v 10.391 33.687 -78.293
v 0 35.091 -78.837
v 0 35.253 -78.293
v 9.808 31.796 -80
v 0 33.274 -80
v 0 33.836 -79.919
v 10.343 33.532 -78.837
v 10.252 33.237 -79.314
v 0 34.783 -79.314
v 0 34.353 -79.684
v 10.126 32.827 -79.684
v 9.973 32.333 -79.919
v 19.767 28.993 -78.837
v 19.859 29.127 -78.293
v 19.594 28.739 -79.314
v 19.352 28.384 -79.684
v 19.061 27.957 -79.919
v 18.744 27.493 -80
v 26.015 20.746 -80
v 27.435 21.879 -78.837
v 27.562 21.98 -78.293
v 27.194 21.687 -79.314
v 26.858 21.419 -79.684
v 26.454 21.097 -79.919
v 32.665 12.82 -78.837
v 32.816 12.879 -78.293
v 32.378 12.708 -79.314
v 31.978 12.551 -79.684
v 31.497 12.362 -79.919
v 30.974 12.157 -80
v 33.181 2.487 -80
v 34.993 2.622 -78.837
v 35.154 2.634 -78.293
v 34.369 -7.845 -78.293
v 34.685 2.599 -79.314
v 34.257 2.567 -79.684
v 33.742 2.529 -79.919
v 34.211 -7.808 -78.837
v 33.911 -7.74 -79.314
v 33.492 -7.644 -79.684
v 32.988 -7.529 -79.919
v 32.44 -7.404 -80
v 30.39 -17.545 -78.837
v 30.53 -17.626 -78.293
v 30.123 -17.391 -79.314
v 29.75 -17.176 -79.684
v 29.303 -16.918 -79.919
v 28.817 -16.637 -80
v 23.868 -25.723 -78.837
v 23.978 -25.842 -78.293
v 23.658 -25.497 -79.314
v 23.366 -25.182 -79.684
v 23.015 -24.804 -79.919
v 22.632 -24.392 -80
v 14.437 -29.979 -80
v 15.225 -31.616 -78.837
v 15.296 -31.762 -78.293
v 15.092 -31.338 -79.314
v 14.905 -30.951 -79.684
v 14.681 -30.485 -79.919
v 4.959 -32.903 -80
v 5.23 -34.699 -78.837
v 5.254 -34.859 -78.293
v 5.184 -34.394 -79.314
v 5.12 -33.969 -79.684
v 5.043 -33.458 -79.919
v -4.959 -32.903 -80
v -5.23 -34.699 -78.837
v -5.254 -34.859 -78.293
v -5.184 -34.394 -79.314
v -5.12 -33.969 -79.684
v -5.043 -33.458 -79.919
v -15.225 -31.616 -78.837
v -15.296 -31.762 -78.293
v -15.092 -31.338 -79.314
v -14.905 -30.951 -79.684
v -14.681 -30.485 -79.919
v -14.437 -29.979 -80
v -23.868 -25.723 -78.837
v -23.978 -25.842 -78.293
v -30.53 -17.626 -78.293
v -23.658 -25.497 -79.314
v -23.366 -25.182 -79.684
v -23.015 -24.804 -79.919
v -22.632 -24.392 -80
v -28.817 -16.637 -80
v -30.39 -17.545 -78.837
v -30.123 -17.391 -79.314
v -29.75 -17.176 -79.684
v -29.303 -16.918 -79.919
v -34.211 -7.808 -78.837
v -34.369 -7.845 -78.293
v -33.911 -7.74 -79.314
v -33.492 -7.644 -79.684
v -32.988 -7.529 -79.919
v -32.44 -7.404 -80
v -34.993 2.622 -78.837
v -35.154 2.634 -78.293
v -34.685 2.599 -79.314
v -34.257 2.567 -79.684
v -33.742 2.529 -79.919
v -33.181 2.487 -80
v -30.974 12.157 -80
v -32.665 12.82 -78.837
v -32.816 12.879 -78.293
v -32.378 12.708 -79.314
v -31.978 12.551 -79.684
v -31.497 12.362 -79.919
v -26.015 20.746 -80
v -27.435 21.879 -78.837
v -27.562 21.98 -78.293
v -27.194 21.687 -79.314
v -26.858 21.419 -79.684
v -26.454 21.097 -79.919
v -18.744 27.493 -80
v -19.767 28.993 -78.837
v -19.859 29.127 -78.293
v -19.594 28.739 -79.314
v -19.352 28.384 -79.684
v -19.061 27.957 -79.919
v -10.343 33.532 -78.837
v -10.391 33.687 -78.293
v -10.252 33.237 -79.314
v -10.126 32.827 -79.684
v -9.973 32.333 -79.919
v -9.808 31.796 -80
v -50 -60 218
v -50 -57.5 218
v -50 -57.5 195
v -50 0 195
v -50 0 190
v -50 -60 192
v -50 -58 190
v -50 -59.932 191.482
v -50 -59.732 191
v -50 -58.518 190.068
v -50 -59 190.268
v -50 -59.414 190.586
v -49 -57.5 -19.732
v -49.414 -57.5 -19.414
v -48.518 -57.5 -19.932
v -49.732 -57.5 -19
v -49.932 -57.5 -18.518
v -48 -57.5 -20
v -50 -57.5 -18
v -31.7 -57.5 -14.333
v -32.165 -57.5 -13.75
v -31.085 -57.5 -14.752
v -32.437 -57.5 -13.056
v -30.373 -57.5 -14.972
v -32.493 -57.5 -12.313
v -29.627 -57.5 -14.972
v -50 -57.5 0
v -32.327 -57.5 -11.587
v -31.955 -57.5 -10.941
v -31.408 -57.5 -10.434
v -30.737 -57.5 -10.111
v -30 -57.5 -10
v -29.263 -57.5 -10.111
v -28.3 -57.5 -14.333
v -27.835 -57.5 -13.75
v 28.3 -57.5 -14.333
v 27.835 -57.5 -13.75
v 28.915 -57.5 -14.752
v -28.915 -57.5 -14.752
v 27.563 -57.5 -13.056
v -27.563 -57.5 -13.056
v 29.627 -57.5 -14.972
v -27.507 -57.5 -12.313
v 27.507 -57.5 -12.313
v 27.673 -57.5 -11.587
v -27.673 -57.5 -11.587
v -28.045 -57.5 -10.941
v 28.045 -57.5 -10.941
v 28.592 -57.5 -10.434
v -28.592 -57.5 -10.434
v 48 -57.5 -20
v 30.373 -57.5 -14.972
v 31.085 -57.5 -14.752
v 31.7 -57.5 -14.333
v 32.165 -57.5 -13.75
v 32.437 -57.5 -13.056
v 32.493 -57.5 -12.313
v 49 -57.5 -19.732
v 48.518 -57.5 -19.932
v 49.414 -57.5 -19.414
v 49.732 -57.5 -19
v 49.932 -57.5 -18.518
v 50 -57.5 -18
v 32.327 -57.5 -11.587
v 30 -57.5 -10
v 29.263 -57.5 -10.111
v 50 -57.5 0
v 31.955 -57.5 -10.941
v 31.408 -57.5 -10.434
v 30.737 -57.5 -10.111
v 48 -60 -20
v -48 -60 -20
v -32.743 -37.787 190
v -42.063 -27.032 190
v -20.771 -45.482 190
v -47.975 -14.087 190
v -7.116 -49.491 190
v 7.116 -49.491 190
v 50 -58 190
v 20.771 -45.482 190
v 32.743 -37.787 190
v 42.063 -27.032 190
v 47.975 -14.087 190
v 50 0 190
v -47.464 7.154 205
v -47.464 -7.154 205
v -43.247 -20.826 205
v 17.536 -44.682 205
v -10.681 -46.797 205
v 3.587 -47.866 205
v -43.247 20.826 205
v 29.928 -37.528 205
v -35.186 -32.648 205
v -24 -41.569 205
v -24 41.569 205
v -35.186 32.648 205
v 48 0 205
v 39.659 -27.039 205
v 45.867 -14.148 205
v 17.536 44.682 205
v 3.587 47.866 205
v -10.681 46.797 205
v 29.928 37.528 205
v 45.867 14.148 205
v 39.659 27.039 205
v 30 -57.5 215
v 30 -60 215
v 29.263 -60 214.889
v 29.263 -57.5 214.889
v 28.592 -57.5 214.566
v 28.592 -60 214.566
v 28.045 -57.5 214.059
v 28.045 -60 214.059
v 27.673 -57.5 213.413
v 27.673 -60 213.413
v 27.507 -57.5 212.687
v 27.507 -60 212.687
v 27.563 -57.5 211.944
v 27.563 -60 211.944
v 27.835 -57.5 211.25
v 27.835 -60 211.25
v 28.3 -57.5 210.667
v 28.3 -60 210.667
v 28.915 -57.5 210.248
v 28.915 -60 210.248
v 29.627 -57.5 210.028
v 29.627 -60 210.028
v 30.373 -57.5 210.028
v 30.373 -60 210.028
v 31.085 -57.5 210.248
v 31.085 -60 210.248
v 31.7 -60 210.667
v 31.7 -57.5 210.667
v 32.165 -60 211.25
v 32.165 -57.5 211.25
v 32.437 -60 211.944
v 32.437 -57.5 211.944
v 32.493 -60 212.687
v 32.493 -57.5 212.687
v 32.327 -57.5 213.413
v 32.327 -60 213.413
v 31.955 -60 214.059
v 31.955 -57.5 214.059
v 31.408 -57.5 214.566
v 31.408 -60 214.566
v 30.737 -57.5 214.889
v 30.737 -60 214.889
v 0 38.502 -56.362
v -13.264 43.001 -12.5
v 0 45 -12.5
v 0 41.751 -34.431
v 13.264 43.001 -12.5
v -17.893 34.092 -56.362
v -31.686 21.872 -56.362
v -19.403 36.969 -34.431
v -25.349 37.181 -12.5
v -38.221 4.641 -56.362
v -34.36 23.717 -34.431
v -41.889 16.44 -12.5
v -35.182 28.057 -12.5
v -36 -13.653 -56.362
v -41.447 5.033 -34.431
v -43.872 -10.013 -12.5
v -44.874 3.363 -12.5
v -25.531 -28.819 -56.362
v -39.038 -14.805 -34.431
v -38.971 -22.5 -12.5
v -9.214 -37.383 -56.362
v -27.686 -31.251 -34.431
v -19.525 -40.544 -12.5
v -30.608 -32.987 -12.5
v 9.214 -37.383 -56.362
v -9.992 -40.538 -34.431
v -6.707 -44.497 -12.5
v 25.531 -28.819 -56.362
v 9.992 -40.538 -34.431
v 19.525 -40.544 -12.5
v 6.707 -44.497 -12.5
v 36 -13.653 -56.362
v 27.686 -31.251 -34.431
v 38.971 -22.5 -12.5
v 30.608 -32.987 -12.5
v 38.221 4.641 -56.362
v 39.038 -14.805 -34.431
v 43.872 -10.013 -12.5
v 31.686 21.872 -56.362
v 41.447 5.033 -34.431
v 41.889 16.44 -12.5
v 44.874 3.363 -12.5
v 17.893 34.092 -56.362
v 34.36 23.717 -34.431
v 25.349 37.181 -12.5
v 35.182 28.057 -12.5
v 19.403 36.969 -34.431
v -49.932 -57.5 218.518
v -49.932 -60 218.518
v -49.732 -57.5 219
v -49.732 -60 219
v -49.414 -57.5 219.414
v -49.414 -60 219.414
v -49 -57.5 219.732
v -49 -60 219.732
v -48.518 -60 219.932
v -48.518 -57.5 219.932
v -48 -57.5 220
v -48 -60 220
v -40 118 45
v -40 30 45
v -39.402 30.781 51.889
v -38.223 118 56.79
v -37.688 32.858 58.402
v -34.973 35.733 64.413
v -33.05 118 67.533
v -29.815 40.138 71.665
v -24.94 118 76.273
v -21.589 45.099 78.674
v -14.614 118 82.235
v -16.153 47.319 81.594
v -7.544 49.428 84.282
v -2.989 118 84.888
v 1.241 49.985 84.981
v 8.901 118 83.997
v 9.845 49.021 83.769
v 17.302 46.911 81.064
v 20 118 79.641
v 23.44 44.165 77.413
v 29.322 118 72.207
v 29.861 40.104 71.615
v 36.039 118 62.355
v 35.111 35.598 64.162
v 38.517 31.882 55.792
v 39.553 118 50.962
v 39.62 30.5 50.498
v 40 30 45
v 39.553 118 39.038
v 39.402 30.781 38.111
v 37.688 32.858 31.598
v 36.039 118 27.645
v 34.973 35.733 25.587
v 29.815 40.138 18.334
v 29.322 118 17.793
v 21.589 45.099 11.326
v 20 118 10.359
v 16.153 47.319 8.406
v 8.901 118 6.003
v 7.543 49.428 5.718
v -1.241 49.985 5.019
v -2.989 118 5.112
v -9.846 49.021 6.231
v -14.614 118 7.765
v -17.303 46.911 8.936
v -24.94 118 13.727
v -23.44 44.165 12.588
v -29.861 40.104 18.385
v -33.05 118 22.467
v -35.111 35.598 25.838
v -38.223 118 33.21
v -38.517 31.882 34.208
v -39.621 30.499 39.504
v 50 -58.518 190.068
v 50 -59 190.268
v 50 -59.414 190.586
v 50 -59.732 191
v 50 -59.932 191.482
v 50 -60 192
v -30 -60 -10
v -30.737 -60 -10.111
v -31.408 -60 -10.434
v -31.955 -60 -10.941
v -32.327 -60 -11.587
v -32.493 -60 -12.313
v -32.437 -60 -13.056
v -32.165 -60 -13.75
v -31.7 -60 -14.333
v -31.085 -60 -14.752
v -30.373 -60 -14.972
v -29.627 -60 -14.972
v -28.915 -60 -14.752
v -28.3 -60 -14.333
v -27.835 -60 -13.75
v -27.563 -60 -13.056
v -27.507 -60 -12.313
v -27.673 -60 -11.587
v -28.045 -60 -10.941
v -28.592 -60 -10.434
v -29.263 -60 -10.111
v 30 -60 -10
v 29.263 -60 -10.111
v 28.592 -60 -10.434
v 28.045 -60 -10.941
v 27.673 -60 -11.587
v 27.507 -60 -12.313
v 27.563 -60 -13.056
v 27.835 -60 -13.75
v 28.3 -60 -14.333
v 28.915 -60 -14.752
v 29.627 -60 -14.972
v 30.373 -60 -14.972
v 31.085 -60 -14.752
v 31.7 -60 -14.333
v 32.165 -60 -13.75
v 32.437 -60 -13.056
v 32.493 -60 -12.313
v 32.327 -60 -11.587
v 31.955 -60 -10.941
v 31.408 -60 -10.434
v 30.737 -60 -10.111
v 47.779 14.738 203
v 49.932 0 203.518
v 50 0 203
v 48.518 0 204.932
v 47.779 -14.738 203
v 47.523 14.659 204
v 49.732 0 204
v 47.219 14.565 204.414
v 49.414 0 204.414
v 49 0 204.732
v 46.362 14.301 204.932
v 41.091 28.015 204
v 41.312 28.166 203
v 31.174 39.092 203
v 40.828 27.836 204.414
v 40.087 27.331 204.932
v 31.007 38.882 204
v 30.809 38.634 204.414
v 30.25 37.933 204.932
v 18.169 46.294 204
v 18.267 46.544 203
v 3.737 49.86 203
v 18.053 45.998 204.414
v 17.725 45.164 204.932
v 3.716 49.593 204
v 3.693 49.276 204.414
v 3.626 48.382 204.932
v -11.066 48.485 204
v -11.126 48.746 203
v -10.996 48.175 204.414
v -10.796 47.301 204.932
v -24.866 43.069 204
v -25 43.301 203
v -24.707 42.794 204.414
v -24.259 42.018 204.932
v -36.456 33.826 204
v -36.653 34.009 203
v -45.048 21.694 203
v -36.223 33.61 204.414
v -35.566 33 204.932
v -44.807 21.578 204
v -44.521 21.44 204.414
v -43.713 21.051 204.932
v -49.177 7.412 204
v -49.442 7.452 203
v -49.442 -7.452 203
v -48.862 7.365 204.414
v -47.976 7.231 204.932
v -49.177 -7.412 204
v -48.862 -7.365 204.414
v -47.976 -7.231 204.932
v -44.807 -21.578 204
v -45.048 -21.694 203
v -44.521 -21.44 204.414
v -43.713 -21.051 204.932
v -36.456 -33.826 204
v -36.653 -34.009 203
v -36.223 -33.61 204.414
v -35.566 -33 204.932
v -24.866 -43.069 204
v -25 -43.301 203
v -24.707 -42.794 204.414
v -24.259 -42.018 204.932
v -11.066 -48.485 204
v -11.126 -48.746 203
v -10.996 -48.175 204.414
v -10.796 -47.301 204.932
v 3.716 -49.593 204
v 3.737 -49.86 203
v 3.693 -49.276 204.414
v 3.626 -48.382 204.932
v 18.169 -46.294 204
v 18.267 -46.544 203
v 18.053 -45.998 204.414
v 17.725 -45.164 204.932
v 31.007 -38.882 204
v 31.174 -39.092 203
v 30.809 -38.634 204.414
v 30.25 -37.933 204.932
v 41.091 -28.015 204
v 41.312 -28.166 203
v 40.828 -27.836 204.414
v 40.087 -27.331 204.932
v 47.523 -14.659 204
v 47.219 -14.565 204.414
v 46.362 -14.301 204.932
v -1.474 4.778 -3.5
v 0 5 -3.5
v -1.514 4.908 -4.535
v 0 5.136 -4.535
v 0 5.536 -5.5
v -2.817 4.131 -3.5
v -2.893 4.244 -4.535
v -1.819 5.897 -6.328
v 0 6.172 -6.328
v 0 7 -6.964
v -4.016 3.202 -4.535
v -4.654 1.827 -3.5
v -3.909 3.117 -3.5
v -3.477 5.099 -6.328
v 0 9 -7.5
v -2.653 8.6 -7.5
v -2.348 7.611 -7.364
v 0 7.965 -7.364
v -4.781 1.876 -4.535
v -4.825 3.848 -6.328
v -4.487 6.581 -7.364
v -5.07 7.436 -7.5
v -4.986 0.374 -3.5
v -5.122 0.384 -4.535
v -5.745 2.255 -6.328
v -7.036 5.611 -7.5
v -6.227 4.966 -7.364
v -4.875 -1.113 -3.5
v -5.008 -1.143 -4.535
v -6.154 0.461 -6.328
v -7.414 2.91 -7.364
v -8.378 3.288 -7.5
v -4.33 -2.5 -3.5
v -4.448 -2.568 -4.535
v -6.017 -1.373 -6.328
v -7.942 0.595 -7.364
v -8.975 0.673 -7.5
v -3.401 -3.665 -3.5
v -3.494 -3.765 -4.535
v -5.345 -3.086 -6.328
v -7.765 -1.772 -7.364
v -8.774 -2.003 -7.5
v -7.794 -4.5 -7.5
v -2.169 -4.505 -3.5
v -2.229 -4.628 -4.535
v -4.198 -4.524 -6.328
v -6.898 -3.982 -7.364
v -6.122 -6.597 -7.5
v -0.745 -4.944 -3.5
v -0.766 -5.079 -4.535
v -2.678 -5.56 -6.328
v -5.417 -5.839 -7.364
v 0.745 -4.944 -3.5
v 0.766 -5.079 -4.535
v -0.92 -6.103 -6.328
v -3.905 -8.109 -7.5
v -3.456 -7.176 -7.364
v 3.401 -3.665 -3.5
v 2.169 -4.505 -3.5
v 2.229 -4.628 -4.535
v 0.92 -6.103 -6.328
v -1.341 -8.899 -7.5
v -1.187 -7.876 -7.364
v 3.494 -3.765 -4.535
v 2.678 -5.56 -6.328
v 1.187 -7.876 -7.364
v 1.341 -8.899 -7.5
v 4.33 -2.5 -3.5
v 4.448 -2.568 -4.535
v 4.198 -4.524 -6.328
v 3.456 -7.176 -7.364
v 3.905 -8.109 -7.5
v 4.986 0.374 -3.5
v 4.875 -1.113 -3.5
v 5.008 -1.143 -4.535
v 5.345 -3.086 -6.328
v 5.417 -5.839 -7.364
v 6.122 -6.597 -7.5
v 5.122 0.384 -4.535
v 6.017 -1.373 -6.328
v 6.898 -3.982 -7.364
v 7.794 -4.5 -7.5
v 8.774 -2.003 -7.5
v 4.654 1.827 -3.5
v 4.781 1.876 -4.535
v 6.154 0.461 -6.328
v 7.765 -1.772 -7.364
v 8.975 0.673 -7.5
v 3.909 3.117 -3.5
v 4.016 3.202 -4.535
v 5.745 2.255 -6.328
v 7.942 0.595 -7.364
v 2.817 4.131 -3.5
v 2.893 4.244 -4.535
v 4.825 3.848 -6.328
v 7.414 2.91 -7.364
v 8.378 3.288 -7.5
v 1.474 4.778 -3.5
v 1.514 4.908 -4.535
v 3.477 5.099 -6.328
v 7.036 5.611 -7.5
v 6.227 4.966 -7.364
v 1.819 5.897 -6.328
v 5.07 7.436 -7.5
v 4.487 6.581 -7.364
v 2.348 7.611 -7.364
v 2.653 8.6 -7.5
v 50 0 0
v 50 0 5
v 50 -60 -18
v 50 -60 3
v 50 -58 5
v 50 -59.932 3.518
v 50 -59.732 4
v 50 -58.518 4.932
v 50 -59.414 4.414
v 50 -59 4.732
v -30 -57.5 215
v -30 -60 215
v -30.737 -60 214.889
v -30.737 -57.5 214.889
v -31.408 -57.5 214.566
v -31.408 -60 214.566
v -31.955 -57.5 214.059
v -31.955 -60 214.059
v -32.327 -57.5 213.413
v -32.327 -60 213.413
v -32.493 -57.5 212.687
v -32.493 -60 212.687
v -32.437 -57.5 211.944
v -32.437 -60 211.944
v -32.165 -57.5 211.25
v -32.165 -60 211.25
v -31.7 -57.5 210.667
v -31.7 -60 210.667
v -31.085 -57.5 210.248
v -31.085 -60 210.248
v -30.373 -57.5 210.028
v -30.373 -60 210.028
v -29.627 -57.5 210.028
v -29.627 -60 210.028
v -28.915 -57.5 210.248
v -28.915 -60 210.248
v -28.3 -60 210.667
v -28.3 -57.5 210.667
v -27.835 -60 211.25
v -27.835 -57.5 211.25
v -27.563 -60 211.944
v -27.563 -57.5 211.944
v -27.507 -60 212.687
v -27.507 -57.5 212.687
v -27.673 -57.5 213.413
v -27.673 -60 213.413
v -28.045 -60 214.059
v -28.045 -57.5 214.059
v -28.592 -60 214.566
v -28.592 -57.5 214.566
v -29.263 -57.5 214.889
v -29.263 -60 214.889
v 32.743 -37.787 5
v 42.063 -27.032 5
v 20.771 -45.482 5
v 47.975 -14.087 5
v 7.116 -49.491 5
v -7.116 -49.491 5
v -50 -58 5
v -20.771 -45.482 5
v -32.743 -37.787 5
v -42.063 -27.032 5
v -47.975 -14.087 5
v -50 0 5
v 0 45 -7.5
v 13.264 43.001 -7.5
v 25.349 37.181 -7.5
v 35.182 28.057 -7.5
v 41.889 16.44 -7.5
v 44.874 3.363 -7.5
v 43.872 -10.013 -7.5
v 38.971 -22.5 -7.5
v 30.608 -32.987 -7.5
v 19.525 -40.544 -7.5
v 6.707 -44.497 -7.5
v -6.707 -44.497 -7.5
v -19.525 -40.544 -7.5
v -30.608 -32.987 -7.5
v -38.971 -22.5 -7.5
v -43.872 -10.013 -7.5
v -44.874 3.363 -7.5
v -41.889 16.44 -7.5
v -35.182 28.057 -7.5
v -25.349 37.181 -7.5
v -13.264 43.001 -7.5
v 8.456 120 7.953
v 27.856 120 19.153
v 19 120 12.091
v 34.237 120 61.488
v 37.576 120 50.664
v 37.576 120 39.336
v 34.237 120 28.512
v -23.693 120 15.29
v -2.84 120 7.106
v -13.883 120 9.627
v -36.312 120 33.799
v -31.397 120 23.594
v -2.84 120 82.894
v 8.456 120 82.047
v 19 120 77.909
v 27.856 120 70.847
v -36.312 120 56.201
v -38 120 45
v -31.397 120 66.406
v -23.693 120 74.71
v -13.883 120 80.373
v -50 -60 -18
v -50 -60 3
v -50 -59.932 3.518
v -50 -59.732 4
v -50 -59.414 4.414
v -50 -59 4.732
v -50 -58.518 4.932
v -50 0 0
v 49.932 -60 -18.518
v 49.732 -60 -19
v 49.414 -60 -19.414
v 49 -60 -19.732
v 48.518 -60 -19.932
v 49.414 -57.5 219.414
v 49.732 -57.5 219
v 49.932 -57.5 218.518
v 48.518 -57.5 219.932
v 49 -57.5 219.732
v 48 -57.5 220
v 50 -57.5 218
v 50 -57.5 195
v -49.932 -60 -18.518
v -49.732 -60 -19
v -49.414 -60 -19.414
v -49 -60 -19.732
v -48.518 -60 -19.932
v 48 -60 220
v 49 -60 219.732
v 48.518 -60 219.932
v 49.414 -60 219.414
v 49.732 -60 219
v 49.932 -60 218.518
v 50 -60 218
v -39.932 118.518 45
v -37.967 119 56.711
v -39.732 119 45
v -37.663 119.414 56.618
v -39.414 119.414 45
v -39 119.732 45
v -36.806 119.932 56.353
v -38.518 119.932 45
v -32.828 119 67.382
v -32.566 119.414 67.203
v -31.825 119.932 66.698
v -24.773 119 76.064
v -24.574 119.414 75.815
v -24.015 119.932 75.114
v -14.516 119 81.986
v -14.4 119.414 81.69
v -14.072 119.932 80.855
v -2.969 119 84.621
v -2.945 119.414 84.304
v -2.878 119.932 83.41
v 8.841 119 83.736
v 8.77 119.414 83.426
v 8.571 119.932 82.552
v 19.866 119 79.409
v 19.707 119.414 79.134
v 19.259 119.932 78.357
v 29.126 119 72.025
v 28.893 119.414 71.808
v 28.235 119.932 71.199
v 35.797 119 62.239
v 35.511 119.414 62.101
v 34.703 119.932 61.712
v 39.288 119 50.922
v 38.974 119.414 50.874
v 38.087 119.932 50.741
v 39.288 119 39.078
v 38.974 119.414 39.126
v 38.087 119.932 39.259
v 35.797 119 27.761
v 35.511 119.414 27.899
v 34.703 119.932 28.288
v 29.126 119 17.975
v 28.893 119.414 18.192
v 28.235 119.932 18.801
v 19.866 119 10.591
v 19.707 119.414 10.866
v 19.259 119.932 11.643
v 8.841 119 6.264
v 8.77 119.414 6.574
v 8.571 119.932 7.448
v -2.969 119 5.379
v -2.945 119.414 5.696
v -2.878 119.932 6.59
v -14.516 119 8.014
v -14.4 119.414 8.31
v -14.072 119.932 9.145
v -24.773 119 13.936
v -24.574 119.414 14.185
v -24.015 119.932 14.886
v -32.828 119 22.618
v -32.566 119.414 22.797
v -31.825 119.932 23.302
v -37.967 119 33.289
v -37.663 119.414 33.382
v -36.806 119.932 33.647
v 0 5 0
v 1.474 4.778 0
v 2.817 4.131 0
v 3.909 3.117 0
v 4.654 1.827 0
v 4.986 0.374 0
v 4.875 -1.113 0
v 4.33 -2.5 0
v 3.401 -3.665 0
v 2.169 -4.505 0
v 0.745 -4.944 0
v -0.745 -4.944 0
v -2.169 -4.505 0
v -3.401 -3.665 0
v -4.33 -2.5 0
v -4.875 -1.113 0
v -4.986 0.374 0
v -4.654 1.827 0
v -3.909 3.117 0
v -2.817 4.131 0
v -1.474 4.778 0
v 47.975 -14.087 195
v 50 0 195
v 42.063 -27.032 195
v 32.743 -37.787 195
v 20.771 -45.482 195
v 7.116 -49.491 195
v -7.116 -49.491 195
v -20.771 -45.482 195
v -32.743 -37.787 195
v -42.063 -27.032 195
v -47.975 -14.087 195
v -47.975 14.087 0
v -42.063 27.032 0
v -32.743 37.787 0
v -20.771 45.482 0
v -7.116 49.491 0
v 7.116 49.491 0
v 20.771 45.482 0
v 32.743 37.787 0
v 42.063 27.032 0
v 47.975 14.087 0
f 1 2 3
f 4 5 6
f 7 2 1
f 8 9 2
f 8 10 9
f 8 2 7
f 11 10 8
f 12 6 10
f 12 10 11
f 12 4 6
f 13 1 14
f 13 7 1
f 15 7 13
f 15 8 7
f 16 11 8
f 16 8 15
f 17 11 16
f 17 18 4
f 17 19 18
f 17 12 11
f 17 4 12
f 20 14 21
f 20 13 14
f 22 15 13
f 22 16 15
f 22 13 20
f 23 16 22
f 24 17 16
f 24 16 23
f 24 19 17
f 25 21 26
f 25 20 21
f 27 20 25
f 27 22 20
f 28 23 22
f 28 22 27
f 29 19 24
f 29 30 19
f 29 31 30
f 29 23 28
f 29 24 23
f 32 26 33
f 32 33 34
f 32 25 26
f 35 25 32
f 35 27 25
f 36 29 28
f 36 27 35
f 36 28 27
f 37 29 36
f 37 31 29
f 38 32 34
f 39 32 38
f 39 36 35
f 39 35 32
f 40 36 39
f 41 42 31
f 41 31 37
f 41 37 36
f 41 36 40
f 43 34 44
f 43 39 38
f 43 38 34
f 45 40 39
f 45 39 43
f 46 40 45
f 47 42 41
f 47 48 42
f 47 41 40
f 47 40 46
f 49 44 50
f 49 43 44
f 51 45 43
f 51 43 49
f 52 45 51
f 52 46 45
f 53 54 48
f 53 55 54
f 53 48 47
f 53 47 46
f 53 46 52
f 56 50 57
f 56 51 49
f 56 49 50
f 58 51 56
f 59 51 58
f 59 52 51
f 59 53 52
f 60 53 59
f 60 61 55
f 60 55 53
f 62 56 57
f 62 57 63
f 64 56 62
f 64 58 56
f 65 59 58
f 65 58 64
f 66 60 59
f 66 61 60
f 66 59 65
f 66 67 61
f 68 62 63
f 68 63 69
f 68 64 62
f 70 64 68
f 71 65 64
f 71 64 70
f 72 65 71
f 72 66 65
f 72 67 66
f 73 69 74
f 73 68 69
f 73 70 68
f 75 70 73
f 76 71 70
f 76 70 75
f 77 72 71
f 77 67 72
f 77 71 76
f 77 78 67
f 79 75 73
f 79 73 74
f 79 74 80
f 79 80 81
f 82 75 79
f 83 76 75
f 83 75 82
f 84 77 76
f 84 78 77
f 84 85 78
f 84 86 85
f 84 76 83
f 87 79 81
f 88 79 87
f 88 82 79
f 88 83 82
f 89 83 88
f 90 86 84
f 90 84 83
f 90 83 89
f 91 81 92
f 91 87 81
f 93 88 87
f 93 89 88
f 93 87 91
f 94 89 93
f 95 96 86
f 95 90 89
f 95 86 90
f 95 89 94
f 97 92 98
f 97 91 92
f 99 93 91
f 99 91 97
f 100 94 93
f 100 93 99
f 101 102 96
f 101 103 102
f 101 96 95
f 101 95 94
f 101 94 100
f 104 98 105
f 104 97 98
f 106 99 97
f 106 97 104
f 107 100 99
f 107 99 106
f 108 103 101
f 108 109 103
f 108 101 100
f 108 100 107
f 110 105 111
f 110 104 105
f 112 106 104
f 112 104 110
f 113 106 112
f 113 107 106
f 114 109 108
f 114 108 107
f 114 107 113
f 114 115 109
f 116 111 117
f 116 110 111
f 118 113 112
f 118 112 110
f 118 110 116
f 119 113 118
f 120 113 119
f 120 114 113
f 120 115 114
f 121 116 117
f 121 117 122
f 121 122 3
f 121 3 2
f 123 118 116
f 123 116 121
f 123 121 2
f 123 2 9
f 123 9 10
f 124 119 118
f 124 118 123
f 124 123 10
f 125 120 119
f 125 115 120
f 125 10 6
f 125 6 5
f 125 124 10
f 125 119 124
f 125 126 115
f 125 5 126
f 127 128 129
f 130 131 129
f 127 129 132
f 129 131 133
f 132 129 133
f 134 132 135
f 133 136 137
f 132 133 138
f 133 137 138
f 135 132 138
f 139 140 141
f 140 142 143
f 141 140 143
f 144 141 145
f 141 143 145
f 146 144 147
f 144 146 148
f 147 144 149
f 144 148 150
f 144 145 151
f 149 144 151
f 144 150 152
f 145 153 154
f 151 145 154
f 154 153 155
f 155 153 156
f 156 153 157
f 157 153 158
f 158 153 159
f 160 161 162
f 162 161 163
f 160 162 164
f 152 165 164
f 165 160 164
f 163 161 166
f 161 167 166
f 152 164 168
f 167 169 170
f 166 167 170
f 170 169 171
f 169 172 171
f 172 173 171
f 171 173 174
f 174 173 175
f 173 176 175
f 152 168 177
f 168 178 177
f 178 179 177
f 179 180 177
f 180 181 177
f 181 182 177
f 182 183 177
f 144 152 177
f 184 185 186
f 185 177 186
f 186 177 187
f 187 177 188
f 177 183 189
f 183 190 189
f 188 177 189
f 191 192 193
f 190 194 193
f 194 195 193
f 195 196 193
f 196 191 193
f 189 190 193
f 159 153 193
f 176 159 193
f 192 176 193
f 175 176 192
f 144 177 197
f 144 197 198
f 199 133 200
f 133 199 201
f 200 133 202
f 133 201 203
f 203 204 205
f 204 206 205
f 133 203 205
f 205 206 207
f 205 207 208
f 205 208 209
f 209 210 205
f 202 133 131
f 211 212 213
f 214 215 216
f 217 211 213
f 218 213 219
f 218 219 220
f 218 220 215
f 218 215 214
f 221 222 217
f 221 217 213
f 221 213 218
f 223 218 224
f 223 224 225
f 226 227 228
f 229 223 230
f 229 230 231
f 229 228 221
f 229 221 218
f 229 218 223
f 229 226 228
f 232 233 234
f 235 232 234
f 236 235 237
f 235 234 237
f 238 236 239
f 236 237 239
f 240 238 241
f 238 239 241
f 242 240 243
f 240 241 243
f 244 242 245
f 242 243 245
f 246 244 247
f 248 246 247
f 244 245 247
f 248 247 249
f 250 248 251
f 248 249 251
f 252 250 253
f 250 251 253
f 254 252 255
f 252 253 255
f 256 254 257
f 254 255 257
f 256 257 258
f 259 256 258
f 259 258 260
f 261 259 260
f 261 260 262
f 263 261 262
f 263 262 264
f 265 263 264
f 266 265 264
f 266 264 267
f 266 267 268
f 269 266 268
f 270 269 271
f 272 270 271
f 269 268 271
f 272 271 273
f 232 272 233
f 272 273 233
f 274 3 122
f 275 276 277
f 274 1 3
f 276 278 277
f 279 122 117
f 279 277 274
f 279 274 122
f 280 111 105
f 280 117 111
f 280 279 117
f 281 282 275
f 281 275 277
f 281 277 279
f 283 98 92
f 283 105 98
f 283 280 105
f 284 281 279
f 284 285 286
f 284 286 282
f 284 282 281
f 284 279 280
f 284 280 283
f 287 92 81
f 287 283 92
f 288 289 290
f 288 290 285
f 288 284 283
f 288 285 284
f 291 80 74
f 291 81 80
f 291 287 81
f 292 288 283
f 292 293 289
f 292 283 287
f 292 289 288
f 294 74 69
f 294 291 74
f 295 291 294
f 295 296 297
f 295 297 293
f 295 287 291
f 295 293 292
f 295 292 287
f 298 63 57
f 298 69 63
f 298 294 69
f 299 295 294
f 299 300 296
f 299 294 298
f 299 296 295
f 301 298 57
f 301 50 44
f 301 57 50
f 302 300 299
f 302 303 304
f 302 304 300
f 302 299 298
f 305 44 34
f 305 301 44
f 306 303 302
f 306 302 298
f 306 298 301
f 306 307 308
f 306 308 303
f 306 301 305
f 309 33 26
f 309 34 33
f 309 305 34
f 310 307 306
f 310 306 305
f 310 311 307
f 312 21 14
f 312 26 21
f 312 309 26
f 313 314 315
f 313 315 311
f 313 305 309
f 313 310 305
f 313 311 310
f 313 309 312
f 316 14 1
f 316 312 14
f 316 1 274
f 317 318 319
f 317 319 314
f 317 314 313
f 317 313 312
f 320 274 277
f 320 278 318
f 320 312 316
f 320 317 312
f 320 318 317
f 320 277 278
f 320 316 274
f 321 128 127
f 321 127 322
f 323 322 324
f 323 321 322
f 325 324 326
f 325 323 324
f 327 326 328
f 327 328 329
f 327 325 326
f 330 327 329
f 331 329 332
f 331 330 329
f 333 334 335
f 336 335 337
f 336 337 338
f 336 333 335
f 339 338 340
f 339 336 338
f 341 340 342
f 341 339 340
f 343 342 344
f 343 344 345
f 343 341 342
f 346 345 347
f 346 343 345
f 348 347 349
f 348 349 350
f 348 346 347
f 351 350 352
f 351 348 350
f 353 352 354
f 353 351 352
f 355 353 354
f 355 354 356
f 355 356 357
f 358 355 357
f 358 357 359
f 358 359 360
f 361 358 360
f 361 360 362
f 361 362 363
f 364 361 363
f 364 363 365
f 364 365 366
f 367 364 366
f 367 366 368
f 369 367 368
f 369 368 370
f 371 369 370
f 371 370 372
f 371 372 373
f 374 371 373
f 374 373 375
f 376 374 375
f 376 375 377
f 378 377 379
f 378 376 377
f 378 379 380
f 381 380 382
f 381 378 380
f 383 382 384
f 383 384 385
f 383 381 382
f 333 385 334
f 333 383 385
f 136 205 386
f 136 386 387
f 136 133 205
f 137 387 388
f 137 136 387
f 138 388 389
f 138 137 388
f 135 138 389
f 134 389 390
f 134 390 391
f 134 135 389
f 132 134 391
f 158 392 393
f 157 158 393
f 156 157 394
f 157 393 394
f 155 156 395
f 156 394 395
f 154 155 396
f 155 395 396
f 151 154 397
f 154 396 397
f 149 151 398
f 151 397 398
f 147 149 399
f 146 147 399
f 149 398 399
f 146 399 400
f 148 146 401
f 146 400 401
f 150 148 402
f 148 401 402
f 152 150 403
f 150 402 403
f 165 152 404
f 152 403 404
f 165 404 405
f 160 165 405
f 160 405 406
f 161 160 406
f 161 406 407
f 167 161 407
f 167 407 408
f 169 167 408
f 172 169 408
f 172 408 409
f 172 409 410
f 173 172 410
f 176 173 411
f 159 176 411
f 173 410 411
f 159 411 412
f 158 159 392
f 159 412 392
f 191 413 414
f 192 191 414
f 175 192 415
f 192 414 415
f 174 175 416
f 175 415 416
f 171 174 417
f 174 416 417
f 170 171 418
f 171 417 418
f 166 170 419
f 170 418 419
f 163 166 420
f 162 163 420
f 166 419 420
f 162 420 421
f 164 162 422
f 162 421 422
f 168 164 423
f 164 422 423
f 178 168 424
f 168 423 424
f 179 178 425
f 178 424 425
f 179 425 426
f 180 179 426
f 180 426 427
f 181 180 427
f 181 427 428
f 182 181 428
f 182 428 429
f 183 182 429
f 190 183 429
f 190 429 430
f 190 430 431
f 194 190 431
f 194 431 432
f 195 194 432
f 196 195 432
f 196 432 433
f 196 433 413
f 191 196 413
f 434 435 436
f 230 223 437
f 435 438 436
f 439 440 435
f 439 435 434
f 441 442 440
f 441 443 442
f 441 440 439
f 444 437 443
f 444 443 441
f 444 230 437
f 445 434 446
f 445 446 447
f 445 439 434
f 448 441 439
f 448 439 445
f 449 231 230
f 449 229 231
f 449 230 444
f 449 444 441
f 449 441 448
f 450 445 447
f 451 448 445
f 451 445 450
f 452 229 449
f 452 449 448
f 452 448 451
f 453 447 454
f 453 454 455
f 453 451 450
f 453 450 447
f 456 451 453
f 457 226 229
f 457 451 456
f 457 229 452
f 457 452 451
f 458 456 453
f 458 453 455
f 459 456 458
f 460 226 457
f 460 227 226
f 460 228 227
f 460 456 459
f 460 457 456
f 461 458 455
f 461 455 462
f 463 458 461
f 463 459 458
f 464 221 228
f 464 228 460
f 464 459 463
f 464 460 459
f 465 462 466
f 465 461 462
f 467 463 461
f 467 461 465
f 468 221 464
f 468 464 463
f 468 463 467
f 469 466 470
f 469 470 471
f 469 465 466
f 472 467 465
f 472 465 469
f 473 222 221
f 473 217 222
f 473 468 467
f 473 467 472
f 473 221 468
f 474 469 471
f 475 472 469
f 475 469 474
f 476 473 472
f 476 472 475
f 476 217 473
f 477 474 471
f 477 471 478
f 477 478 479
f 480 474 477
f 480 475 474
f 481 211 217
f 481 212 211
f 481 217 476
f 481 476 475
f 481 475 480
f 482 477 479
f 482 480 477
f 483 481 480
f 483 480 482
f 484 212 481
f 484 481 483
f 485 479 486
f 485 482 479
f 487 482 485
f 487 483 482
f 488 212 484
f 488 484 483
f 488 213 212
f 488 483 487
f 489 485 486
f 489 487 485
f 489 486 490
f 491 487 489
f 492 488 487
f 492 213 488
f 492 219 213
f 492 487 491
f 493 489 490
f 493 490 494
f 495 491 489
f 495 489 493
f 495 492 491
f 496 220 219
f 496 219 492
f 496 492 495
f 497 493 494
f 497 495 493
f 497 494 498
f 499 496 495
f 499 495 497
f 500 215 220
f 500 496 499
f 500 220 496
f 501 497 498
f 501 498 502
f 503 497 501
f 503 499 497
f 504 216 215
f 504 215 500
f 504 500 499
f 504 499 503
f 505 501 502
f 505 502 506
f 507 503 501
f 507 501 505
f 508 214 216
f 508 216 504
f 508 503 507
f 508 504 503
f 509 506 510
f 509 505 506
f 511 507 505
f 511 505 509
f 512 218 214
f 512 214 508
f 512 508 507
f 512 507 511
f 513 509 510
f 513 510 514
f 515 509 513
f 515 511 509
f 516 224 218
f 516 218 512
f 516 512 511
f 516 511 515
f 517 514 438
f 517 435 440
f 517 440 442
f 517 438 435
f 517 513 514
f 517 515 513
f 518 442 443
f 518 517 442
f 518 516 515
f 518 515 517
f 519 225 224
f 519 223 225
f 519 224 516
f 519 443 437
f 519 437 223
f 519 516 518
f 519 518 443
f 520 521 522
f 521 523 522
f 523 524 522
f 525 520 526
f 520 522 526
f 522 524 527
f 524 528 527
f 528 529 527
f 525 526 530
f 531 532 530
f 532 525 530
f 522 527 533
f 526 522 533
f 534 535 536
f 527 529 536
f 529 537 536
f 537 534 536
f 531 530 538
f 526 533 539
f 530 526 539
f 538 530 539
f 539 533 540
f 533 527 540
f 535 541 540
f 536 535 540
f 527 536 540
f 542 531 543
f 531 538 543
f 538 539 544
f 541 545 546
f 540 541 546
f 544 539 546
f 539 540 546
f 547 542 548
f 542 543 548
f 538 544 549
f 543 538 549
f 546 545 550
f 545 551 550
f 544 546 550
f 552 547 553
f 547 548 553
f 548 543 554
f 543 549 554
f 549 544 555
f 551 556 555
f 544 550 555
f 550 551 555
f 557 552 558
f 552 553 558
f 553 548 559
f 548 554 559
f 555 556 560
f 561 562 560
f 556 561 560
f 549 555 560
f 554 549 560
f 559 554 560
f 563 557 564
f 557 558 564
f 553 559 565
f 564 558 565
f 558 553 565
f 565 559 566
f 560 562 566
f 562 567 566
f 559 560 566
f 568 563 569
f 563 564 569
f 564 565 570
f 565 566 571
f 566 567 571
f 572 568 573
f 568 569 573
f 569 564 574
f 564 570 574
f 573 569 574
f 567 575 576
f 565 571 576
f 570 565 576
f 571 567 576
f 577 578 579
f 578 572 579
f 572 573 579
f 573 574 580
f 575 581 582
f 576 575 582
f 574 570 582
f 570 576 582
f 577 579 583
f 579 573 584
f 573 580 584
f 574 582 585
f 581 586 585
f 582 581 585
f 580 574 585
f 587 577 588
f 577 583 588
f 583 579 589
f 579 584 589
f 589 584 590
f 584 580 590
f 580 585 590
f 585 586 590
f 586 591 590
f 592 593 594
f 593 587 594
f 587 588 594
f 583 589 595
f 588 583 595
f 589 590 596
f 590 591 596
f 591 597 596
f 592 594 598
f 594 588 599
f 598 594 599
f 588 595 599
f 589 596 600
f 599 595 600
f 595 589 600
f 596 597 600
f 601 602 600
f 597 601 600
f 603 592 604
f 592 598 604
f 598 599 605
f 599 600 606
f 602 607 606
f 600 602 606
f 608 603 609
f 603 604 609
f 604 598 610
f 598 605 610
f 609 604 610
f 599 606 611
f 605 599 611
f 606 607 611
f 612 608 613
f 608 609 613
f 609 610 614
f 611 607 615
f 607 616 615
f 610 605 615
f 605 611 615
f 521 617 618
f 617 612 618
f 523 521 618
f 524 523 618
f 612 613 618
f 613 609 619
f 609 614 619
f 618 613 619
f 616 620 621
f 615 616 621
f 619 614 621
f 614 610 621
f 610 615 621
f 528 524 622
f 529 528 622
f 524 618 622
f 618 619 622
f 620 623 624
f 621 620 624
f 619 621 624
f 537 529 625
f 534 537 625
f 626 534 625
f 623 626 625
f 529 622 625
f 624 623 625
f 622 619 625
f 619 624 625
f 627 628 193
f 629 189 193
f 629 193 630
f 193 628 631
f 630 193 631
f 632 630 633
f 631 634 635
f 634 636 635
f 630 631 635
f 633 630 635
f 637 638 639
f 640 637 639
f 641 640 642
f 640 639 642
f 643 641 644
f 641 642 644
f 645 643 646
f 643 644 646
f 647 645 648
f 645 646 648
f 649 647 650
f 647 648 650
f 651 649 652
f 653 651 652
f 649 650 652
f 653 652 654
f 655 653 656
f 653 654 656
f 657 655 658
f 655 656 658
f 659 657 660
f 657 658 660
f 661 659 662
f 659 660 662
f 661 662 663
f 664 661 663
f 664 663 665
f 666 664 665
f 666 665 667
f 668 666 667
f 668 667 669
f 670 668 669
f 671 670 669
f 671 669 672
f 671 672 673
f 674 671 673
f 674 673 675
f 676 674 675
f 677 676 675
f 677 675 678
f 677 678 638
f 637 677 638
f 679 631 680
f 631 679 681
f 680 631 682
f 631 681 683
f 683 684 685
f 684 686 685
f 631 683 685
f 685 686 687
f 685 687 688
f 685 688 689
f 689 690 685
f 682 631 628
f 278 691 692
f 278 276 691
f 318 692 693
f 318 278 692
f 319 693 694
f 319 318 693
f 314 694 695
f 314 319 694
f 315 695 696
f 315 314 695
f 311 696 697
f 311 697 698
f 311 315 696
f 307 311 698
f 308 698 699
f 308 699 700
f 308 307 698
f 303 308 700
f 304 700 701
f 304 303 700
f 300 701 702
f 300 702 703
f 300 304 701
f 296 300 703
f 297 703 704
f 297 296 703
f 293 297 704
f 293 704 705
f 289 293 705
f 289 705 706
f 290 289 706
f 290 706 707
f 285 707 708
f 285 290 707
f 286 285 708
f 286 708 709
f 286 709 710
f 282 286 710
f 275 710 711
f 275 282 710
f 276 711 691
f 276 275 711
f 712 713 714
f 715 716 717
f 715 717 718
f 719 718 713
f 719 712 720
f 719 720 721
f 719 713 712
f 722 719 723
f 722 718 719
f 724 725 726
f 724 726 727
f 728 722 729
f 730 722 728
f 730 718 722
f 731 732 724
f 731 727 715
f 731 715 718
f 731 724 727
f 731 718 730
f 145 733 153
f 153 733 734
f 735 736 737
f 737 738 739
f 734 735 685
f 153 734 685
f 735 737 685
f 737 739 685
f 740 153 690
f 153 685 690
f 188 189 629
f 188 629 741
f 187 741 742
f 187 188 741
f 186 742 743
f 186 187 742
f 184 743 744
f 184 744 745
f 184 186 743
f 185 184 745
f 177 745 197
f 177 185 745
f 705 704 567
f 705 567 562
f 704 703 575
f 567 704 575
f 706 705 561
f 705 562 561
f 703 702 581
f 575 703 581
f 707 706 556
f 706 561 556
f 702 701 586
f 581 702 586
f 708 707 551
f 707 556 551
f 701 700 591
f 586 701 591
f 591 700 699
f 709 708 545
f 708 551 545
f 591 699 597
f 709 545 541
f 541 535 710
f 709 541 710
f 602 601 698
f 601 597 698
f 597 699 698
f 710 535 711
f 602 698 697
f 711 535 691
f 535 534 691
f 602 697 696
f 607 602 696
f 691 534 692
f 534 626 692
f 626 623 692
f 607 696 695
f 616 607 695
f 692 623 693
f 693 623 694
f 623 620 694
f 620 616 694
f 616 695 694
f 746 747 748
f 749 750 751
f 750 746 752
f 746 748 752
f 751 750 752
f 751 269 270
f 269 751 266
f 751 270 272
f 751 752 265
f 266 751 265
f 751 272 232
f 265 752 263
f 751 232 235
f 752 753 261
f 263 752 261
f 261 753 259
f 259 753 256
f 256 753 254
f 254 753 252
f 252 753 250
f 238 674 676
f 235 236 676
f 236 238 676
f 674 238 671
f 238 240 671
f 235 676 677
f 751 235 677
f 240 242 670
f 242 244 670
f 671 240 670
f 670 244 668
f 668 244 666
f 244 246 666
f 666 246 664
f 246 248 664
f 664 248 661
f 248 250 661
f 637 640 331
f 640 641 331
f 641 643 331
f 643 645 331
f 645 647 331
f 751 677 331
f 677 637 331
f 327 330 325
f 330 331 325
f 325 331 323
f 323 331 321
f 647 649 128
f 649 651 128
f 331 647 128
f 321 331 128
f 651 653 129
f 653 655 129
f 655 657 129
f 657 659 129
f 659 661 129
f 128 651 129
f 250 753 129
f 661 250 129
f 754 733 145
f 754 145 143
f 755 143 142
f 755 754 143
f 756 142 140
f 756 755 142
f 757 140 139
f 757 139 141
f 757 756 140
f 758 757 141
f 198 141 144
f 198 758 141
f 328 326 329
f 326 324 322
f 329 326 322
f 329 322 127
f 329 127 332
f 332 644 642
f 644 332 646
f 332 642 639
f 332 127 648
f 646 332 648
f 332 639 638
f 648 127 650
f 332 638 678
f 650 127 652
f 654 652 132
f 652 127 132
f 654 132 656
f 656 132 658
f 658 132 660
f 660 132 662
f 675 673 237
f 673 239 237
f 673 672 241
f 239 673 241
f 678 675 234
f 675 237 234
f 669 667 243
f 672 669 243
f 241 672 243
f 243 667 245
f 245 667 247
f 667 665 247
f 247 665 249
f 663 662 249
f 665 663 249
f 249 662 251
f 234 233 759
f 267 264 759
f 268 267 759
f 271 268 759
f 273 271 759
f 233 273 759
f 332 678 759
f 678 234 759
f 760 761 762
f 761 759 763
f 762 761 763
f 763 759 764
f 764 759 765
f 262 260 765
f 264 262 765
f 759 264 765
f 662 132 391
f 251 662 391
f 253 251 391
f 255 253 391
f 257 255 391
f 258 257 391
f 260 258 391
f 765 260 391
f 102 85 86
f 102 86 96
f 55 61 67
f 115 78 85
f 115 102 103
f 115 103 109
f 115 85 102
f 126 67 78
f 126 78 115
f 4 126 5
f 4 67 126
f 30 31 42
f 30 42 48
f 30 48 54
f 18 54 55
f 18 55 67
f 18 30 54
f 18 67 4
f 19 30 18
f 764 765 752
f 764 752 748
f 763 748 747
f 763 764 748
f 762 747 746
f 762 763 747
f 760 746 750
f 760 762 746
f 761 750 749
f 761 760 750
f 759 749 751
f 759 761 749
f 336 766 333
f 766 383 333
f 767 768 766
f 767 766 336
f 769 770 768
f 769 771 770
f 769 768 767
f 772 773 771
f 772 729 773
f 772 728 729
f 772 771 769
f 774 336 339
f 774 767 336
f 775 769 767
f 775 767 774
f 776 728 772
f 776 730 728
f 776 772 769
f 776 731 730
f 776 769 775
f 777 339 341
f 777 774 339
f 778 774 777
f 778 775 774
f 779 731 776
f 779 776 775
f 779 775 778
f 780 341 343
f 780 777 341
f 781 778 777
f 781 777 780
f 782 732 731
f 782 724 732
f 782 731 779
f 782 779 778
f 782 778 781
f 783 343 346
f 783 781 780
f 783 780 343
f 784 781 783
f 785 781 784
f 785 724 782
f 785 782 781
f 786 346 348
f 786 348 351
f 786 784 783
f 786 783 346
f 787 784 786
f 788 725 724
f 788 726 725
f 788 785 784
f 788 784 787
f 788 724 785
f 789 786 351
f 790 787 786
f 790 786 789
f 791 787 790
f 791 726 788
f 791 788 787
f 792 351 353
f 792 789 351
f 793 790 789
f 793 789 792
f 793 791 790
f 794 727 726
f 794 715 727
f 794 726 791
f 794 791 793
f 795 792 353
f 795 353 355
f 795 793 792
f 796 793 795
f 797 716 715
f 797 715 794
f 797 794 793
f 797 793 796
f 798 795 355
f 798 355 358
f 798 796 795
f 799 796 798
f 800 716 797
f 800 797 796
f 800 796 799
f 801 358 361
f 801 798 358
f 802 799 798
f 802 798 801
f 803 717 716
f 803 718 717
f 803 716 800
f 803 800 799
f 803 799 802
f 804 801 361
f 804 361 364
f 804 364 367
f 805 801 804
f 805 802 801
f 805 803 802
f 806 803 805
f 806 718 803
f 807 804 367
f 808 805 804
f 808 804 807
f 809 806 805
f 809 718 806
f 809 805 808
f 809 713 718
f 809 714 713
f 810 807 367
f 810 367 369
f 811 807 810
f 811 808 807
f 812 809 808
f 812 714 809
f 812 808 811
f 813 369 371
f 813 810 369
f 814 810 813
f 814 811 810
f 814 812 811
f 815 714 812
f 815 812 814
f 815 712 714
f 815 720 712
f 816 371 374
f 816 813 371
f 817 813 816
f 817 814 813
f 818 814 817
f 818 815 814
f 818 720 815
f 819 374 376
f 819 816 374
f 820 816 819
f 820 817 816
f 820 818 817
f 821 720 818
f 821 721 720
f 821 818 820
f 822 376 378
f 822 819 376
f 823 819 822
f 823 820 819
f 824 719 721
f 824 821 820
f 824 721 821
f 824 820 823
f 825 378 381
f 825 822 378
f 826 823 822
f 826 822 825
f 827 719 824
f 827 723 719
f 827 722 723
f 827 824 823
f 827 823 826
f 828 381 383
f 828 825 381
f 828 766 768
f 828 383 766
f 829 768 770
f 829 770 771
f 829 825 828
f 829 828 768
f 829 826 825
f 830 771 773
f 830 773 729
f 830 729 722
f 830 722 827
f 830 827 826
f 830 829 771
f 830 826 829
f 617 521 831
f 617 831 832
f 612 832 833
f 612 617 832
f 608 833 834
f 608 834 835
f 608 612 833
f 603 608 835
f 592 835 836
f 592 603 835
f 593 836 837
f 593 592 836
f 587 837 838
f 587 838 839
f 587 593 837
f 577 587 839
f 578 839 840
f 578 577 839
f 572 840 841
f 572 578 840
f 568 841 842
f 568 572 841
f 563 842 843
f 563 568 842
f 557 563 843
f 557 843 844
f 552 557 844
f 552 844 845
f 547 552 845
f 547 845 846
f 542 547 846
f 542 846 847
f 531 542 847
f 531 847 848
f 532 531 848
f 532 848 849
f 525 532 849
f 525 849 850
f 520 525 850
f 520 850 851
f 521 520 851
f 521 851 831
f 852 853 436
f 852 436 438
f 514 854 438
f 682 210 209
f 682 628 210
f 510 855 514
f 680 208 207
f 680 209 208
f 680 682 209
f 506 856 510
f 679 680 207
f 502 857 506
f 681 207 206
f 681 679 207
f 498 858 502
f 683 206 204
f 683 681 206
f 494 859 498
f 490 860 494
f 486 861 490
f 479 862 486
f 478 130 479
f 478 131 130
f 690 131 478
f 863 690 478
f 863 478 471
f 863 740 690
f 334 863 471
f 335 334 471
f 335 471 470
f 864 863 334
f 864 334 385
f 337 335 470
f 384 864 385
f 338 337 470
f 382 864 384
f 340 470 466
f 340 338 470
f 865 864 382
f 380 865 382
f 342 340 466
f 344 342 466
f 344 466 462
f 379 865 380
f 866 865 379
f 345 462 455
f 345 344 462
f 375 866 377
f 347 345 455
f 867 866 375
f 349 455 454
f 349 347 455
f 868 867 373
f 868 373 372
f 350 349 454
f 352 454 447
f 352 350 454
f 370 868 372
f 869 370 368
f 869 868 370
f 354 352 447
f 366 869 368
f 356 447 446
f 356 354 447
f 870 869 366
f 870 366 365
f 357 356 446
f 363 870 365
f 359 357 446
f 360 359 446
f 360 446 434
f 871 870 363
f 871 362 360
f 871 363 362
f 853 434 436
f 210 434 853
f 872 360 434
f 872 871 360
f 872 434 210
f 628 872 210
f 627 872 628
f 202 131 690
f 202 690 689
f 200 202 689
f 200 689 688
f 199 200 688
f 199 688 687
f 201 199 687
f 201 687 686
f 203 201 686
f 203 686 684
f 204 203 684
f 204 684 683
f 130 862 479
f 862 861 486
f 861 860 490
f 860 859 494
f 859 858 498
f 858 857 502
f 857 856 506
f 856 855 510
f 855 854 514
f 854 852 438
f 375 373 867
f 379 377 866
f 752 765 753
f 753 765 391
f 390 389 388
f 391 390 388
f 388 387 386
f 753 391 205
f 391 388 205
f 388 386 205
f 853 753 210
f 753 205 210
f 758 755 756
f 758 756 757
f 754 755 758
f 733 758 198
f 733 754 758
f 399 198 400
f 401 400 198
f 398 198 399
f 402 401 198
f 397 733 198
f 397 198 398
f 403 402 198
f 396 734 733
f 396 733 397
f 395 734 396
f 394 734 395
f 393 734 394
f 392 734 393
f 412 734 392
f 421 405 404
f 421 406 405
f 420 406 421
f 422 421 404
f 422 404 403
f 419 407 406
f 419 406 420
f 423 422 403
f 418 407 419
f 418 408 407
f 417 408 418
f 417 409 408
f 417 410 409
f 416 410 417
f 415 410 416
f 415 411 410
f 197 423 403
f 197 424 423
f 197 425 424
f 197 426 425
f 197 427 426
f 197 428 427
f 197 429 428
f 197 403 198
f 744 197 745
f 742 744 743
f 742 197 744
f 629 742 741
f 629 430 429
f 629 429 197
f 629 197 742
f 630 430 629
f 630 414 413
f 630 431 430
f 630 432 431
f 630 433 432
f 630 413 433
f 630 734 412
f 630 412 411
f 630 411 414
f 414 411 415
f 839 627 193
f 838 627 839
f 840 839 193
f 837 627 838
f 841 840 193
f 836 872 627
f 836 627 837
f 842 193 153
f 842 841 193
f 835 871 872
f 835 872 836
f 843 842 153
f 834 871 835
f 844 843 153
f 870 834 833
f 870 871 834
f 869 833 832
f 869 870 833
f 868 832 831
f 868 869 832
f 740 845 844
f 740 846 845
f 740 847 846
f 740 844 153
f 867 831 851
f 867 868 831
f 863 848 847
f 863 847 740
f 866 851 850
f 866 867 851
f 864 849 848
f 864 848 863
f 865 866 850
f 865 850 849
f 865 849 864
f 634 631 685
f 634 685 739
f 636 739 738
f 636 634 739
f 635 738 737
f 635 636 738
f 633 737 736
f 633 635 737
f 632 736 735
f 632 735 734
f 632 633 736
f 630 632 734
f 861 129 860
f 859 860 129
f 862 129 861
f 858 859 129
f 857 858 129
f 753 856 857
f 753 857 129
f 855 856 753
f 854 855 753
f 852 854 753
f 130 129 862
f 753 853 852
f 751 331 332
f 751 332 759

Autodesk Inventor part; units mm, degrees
ref_plane "YZ Plane" through (0, 0, 0) normal (1, 0, 0) x (0, 1, 0)
sketch "Sketch1" plane through (0, 0, 0) normal (0, 0, 1) x (1, 0, 0)
  circle A0 centre (0, 0) radius 50
  dimension "d0" = 100
extrude "Extrusion1" add sketch "Sketch1" along normal blind 205
sketch "Sketch2" plane through (0, 0, 0) normal (1, 0, 0) x (0, 1, 0)
  line L0 (-50, 0) -> (50, 0) construction
  line L1 (0, 0) -> (0, -80)
  line L2 (0, -80) -> (35, -80)
  line L3 (0, 0) -> (5, 0)
  line L4 (5, 0) -> (5, -3.5)
  line L5 (9, -7.5) -> (45, -7.5)
  line L6 (45, -7.5) -> (45, -12.5)
  line L7 (45, -12.5) -> (35, -80)
  arc A0 (5, -3.5) -> (9, -7.5) centre (9, -3.5) ccw
  point P0 (5, -7.5)
  dimension "d3" = 80
  dimension "d4" = 35
  dimension "d5" = 5
  dimension "d6" = 7.5
  dimension "d7" = 40
  dimension "d8" = 5
  dimension "d9" = 4
revolve "Revolution1" add sketch "Sketch2" angle 360 about axis through (0, 0, 0) along (0, 0, -1)
ref_plane "Work Plane1" through (0, 120, 0) normal (0, 1, 0) x (-1, 0, 0)
sketch "Sketch3" plane through (0, 120, 0) normal (0, 1, 0) x (-1, 0, 0)
  line L0 (-50, 0) -> (50, 0) construction
  circle A0 centre (0, 45) radius 40
  line L1 (-50, 0) -> (-50, 205) construction
  point P0 (0, 0)
  dimension "d19" = 80
  dimension "d20" = 45
  dimension "d21" = 50
extrude "Extrusion2" add sketch "Sketch3" against normal blind 90
ref_plane "Work Plane2" through (0, 0, 195) normal (0, 0, 1) x (1, 0, 0)
sketch "Sketch4" plane through (0, 0, 195) normal (0, 0, 1) x (1, 0, 0)
  circle A0 centre (0, -60) radius 50 construction
  circle A1 centre (0, 0) radius 45 construction
  arc A2 (-44.9972, -0.4998) -> (44.9999, 0.1033) centre (0.0033, -0.4998) ccw
  line L0 (-50, -60) -> (50, -60)
  circle A3 centre (0, 0) radius 50 construction
  line L1 (-50, -60) -> (-50, 0)
  circle A4 centre (0, 0) radius 50 construction
  line L2 (50, -60) -> (50, 0)
  arc A5 (-50, 0) -> (50, 0) centre (0, 0) ccw
  point P0 (-44.9972, -38.1998)
  point P1 (44.9999, -81.7947)
  dimension "d26" = 100
  dimension "d27" = 60
  dimension "d29" = 90
extrude "Extrusion3" add sketch "Sketch4" against normal blind 5
sketch "Sketch7" plane through (0, 0, 0) normal (0, 0, -1) x (-1, 0, 0)
  line L0 (-50, -60) -> (50, -60) construction
  line L1 (50, -60) -> (50, 0) construction
  arc A0 (-50, 0) -> (50, 0) centre (0, 0) ccw construction
  line L2 (-50, 0) -> (-50, -60) construction
  line L3 (-50, -60) -> (50, -60)
  line L4 (50, -60) -> (50, 0)
  circle A1 centre (0, 0) radius 50 construction
  line L5 (-50, -60) -> (50, -60) projected
  line L6 (-50, 0) -> (-50, -60) projected
  line L7 (-50, -60) -> (-50, 0)
  arc A2 (-50, 0) -> (50, 0) centre (0, 0) ccw
extrude "Extrusion5" add sketch "Sketch7" against normal blind 5
sketch "Sketch8" plane through (0, 0, 0) normal (0, 0, -1) x (-1, 0, 0)
  line L0 (50, -60) -> (-50, -60) projected
  line L1 (50, 0) -> (50, -60) construction
  line L2 (-50, -60) -> (50, -60)
  line L3 (50, -60) -> (50, -57.5)
  line L4 (50, -57.5) -> (-50, -57.5)
  line L5 (-50, -57.5) -> (-50, -60)
  point P0 (0, 0)
  dimension "d37" = 2.5
extrude "Extrusion6" add sketch "Sketch8" along normal blind 20
sketch "Sketch9" plane through (-50, -57.5, 0) normal (0, 1, 0) x (1, 0, 0)
  circle A0 centre (20, 12.5) radius 5 construction
  circle A1 centre (80, 12.5) radius 5 construction
  line L0 (0, 0) -> (0, 20) construction
  line L1 (100, 0) -> (0, 0) construction
  point P0 (50, 0)
  dimension "d40" = 10
  dimension "d41" = 10
  dimension "d42" = 60
  dimension "d43" = 20
  dimension "d45" = 12.5
hole "Hole1" at (-30, -57.5, -12.5) at (30, -57.5, -12.5) direction (0, -1, 0) diameter 5 end through all
sketch "Sketch10" plane through (0, 0, 195) normal (0, 0, 1) x (1, 0, 0)
  line L0 (50, 0) -> (50, -60) construction
  line L1 (-50, -60) -> (50, -60)
  line L2 (50, -60) -> (50, -57.5)
  line L3 (50, -57.5) -> (-50, -57.5)
  line L4 (-50, -57.5) -> (-50, -60)
  point P0 (0, 0)
  dimension "d53" = 2.5
extrude "Extrusion7" add sketch "Sketch10" along normal blind 25
sketch "Sketch11" plane through (-50, -57.5, 195) normal (0, 1, 0) x (1, 0, 0)
  circle A0 centre (20, -17.5) radius 5 construction
  circle A1 centre (80, -17.5) radius 5 construction
  line L0 (100, -25) -> (0, -25) construction
  line L1 (0, 0) -> (0, -25) construction
  point P0 (50, 195)
  dimension "d56" = 10
  dimension "d57" = 10
  dimension "d58" = 7.5
  dimension "d59" = 20
  dimension "d60" = 60
hole "Hole2" at (-30, -57.5, 212.5) at (30, -57.5, 212.5) direction (0, -1, 0) diameter 5 end through all
fillet "Fillet1" radius 2 9 edges at (-50, 0, 205) (-50, -58.75, 220) (50, -58.75, 220) (-50, -58.75, -20) (50, -58.75, -20) (0, -60, 5) (0, -60, 190) (0, -35, -80) (40, 120, 45)
properties part number "Compressor_PX06" material "Polyethylene, High Density"
